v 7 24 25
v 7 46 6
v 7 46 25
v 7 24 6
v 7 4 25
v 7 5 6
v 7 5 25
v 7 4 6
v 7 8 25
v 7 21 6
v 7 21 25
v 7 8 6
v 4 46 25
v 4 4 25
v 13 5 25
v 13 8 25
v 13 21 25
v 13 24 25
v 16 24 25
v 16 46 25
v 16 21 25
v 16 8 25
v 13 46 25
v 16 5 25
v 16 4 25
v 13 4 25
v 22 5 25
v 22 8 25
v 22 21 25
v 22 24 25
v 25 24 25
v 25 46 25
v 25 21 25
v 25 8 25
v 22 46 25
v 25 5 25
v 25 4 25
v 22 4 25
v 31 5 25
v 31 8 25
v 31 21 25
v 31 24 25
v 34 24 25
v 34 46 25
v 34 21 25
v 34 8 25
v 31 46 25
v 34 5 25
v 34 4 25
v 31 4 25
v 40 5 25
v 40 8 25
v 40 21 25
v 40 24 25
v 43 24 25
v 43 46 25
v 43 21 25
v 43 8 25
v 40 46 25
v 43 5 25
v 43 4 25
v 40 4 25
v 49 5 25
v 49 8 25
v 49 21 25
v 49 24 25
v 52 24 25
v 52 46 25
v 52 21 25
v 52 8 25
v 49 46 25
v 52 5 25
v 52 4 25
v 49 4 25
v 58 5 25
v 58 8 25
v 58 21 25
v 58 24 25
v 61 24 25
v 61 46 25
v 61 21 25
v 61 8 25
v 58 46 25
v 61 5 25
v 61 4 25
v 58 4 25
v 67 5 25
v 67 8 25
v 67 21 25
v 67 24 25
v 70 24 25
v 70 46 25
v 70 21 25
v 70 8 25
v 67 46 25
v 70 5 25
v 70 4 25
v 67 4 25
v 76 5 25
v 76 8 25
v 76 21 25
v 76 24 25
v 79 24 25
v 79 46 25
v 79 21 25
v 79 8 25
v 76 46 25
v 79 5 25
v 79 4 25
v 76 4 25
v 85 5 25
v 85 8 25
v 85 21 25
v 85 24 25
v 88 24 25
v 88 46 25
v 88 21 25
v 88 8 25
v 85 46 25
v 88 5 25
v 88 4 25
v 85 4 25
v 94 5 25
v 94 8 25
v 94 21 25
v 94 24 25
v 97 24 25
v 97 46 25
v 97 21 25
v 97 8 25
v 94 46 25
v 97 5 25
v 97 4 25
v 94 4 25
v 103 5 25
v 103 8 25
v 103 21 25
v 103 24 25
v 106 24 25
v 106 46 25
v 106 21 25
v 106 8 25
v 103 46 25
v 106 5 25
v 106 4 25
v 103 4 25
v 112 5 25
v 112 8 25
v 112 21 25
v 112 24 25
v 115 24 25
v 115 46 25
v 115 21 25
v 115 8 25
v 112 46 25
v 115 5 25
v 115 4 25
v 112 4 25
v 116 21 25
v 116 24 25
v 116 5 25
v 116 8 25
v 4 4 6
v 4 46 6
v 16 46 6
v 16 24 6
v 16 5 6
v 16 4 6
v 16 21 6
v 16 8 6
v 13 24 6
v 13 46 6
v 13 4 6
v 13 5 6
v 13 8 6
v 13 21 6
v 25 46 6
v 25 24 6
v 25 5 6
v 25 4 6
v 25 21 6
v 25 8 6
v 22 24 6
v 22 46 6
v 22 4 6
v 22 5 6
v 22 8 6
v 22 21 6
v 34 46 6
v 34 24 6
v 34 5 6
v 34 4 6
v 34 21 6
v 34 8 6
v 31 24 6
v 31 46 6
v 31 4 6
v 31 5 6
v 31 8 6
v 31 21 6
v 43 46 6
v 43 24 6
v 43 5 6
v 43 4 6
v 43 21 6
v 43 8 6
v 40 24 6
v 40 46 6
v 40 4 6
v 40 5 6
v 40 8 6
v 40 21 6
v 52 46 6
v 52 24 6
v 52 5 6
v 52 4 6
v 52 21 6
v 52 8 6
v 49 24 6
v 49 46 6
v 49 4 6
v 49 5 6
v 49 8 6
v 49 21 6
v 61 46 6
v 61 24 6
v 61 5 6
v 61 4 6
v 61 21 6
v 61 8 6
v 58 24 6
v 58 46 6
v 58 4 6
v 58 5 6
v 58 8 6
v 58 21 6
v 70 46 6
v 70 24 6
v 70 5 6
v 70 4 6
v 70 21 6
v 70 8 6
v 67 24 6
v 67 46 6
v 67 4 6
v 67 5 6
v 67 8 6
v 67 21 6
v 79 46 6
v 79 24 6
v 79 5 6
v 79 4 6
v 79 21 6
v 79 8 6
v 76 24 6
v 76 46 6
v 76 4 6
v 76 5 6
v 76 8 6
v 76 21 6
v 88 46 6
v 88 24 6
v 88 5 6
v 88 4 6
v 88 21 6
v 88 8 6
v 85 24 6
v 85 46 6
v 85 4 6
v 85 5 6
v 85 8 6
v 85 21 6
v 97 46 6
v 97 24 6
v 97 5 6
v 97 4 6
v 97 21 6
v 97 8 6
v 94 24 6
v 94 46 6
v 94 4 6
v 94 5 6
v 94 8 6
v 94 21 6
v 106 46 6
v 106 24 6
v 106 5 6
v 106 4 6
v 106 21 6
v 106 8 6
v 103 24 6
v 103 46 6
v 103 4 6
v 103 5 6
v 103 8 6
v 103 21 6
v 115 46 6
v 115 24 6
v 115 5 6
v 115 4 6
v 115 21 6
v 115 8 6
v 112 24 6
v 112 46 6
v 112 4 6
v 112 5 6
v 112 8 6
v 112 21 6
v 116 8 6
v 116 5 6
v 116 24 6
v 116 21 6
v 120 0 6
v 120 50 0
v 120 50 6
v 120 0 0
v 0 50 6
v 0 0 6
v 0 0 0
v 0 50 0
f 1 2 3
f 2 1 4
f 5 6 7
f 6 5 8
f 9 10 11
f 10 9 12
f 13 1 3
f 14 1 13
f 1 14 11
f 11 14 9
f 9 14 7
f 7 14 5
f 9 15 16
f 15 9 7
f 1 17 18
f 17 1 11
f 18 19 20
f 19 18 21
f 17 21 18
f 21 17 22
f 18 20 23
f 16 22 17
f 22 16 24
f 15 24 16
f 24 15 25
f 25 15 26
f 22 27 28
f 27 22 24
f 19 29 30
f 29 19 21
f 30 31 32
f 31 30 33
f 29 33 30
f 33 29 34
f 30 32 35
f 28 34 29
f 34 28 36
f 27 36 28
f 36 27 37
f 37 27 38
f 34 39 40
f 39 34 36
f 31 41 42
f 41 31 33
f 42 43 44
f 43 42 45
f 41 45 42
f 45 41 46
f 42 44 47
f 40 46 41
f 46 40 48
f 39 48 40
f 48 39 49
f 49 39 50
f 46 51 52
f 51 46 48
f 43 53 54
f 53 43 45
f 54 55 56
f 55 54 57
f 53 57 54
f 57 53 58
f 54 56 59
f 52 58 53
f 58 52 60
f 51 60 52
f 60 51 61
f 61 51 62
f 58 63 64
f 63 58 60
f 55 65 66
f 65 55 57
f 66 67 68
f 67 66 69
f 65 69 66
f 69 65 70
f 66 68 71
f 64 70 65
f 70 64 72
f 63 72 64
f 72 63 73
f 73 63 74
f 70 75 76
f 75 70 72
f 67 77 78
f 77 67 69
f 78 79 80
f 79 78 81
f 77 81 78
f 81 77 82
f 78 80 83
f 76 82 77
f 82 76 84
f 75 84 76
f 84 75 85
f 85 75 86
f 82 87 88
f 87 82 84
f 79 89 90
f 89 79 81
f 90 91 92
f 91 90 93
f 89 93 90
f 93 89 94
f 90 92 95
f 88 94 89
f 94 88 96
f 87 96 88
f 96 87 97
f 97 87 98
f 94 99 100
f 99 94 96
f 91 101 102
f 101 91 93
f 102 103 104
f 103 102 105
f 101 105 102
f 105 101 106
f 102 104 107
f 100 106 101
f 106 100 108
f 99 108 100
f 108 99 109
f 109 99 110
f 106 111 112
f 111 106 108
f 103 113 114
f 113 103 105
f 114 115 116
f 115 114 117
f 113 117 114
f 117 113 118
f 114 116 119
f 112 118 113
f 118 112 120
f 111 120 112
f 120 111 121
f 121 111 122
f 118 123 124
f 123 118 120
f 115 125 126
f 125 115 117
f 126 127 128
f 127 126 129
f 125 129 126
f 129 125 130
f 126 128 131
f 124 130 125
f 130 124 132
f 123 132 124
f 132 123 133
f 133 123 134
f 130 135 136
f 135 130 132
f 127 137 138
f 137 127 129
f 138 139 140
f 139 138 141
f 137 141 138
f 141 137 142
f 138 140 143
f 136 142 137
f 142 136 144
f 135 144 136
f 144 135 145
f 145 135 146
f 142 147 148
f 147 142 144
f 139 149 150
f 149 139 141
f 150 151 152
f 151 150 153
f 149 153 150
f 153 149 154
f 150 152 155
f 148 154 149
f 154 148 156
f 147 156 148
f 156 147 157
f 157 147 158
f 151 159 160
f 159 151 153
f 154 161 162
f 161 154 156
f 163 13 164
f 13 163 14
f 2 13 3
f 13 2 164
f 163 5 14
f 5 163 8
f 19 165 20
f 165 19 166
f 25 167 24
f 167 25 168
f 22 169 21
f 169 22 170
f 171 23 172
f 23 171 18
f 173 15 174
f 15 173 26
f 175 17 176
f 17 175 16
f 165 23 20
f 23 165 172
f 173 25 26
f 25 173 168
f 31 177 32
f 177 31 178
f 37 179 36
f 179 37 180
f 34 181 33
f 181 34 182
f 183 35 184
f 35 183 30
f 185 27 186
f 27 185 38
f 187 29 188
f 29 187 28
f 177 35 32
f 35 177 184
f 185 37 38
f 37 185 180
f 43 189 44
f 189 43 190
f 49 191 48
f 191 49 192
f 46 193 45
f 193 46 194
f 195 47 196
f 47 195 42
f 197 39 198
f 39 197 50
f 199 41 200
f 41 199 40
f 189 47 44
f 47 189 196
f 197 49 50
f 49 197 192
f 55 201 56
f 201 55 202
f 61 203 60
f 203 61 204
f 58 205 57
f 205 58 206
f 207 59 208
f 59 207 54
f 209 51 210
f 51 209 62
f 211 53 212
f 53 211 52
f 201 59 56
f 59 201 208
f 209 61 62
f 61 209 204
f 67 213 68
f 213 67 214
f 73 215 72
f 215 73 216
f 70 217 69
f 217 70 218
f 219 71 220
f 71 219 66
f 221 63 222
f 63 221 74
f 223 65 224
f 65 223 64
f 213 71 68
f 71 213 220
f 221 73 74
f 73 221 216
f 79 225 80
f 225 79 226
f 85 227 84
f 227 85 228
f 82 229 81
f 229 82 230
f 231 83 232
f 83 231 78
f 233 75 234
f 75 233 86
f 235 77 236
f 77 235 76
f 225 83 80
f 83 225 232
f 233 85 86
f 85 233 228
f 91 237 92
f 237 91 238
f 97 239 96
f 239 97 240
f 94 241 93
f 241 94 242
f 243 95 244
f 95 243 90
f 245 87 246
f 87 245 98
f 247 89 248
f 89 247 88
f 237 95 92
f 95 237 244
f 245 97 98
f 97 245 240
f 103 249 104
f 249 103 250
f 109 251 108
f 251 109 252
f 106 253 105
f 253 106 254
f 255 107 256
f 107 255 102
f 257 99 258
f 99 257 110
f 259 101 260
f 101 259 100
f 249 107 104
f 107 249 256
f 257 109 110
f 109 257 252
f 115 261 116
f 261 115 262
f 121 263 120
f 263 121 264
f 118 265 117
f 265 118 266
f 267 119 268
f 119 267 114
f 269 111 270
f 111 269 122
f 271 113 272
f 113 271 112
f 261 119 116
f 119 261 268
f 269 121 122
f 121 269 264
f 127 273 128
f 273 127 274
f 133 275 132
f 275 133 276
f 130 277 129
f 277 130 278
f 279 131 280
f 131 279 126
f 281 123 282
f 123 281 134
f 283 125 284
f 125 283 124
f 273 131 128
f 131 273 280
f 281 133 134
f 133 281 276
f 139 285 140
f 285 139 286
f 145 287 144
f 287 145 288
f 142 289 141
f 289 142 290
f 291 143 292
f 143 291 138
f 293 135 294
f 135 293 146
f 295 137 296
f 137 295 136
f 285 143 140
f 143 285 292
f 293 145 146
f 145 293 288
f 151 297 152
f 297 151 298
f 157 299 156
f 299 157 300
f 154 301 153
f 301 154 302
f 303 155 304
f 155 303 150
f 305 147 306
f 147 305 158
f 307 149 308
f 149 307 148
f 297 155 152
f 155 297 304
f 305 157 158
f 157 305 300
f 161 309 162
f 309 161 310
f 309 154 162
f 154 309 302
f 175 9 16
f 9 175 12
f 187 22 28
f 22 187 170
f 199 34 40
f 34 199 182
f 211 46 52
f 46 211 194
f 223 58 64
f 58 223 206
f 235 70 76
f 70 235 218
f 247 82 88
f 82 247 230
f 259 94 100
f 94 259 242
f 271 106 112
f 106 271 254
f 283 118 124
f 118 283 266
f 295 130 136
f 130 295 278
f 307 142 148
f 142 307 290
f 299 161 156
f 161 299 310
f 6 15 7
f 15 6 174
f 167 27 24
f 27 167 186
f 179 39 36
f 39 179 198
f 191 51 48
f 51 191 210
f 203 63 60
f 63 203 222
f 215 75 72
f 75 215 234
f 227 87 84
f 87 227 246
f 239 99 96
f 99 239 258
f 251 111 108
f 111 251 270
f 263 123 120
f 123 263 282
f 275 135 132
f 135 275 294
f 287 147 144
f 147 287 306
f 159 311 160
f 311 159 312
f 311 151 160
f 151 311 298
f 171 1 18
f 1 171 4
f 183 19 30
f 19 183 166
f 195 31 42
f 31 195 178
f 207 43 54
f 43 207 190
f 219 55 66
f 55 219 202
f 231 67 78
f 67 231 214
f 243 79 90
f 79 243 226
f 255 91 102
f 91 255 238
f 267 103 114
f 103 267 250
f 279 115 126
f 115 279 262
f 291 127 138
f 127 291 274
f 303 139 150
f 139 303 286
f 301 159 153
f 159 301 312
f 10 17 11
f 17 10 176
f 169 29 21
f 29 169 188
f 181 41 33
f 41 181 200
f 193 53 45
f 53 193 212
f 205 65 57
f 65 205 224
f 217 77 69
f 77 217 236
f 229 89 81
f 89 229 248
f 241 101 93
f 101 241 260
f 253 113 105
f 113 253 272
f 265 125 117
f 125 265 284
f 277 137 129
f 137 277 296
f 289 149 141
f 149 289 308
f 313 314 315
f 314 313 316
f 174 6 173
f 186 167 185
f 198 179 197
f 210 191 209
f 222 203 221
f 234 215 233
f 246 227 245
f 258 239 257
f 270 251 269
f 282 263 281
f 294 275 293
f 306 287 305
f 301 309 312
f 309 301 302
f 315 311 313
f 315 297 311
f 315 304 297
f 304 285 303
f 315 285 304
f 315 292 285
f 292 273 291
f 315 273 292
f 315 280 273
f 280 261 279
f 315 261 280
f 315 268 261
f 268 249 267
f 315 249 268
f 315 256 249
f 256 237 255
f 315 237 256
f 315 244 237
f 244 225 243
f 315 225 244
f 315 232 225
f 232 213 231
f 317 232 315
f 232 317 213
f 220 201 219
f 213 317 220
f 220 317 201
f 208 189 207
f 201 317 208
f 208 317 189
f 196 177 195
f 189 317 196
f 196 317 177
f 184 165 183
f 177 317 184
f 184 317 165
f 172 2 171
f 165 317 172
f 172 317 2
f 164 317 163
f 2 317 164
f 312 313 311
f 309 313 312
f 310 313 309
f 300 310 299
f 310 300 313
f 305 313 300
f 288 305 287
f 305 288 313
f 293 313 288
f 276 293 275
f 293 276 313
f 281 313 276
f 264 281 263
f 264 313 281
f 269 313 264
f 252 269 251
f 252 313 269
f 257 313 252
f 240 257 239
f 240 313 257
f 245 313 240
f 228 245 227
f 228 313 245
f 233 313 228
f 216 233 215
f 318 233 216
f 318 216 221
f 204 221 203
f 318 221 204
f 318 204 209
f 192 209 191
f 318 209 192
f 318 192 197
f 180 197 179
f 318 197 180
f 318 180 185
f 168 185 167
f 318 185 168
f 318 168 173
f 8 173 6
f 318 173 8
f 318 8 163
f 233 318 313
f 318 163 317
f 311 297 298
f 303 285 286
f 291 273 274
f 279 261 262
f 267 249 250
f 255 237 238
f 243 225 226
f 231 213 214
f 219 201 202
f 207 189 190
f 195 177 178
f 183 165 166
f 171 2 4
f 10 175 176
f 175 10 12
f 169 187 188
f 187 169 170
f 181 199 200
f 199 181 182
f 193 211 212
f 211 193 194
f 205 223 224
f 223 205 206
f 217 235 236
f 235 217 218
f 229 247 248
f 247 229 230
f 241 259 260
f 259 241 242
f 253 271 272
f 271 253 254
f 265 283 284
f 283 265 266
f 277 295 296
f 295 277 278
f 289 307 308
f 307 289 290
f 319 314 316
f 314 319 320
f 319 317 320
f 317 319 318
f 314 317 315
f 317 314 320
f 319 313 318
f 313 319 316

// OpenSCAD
$fn = 32;

// ----------------------------------------------------------------------
// Heatsink: cross fin block
// ----------------------------------------------------------------------

// --- parameters (mm) ---
base_l = 120;             // base length, X
base_w = 50;              // base width, Y
base_t = 6;               // base plate thickness
fin_h = 20;               // fin height above the base
fin_t = 3;                // fin thickness
edge = 4;                 // margin from the base ends
pitch = 9;                // fin pitch
rib_pitch = 16;           // cross rib pitch

n_fins = floor((base_l - 2 * edge - fin_t) / pitch) + 1;  // fin count
total_h = base_t + fin_h - 1;  // overall height
n_ribs = floor((base_w - 2 * edge) / rib_pitch);  // rib count

union() {
  cube([base_l, base_w, base_t]);
  for (i = [0 : n_fins - 1])
    translate([edge + i * pitch, edge, base_t - 1])
      cube([fin_t, base_w - 2 * edge, fin_h]);
  for (i = [0 : n_ribs - 1])
    translate([edge, edge + 1 + i * rib_pitch, base_t - 1])
      cube([base_l - 2 * edge, fin_t, fin_h]);
}
